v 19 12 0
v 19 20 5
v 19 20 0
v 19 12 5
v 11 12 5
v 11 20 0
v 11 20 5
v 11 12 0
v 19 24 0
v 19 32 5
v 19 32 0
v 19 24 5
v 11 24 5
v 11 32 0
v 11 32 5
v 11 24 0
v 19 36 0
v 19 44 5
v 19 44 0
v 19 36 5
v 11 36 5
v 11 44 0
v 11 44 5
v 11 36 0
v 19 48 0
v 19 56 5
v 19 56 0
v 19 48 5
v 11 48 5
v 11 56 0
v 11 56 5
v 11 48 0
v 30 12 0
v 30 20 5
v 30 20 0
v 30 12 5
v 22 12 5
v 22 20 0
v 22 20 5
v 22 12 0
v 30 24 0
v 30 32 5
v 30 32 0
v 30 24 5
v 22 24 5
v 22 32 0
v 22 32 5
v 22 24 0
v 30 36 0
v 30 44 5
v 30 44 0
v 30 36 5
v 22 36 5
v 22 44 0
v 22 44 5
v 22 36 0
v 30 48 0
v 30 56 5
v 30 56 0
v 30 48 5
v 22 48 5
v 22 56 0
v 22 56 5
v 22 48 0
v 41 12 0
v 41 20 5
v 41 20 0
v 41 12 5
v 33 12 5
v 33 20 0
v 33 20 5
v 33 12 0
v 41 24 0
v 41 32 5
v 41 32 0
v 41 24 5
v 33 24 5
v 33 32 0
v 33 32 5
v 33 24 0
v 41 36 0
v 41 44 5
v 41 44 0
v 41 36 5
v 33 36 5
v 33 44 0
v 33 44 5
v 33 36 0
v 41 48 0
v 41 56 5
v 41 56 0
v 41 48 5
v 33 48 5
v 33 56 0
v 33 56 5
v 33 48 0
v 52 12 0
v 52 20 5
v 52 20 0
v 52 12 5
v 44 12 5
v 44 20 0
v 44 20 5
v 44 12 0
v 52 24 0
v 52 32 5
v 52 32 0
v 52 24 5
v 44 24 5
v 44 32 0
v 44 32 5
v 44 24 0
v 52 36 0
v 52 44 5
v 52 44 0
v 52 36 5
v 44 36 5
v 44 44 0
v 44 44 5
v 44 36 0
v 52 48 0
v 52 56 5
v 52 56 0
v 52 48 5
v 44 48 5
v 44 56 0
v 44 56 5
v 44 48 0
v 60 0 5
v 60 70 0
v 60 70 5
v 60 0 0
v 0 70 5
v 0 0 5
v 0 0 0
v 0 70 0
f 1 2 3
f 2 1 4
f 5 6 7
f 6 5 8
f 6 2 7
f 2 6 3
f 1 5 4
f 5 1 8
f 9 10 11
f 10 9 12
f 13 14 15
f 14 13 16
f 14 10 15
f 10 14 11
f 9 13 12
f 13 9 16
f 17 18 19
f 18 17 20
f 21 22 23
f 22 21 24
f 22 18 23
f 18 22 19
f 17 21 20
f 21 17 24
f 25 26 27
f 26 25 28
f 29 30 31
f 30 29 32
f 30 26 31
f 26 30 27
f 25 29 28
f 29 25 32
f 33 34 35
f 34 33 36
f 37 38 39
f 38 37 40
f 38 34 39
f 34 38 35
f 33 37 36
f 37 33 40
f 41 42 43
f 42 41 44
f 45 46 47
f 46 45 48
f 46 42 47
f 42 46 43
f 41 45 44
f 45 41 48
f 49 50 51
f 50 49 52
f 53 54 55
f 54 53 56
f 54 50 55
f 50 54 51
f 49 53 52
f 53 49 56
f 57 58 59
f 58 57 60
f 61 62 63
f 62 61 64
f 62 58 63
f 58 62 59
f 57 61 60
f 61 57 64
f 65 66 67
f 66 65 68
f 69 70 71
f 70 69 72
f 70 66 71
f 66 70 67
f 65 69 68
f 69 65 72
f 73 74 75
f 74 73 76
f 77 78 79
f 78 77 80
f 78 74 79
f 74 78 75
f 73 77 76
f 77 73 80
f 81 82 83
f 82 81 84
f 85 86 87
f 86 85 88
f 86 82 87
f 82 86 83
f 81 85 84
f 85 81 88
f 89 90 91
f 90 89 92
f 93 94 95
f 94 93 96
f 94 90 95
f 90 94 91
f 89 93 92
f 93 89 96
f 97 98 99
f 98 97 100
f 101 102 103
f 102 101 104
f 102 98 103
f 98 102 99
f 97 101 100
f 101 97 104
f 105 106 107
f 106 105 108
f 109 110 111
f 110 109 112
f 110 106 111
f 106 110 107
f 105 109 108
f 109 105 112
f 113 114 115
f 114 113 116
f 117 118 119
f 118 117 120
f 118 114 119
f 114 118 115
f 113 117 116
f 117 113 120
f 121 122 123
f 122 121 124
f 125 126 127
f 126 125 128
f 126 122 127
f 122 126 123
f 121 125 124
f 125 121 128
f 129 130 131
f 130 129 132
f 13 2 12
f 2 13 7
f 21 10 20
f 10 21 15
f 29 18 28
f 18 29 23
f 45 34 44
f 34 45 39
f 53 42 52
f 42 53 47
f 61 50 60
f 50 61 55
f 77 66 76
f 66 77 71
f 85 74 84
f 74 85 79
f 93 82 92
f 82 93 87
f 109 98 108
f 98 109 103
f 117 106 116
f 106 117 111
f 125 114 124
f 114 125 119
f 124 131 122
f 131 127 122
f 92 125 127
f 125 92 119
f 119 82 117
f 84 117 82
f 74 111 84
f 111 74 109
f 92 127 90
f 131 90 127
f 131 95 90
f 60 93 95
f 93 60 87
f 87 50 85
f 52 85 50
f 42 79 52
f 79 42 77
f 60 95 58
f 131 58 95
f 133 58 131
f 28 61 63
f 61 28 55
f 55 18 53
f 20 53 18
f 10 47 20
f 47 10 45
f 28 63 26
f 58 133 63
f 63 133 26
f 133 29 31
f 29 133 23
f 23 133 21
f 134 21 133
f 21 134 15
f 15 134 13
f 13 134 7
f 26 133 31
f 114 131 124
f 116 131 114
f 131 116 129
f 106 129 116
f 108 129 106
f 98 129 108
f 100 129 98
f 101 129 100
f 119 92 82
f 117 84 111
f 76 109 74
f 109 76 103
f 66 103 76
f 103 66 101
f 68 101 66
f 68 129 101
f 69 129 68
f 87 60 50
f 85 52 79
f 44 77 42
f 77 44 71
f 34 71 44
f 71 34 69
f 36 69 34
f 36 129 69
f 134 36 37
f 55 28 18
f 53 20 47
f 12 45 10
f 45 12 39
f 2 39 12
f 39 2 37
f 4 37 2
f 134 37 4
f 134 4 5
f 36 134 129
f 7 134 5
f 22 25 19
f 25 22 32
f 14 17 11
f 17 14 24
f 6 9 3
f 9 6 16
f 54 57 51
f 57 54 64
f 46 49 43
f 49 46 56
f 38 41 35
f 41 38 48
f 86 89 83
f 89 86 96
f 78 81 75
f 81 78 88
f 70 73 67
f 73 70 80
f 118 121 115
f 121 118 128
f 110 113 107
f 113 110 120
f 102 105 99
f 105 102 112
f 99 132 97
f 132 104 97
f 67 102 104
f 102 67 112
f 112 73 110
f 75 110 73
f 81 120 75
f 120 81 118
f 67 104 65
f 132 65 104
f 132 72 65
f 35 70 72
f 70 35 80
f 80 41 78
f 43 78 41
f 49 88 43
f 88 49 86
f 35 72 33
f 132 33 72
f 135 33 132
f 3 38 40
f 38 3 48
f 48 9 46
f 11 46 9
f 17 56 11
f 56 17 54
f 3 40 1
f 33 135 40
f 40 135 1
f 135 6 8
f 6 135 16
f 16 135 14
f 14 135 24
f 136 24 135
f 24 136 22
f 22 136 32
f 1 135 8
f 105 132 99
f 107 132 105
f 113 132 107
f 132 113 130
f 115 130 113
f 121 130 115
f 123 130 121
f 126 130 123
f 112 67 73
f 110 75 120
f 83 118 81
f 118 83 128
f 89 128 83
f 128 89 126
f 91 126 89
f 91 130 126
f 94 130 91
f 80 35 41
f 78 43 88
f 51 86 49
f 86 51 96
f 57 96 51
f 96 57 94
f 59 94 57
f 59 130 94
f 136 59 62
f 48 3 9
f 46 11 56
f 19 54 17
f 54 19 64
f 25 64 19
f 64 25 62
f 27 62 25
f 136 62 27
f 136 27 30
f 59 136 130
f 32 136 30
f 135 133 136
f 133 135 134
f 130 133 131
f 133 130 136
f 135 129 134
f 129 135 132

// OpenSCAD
w = 60;
h=70;
l=5;

hw=8;
hg =3;
countw = w/(hw+hg);

vw=8;
vg=4;
countv = h/(vw+vg);

difference(){
cube([w,h,l]);

for(i = [1:countw-1]){
    for(j = [1:countv-1]){
        translate([i*(hw+hg),j*(vw+vg),-1])
        color("green")
        cube([hw,vw,l+100]);
    }
}
}
